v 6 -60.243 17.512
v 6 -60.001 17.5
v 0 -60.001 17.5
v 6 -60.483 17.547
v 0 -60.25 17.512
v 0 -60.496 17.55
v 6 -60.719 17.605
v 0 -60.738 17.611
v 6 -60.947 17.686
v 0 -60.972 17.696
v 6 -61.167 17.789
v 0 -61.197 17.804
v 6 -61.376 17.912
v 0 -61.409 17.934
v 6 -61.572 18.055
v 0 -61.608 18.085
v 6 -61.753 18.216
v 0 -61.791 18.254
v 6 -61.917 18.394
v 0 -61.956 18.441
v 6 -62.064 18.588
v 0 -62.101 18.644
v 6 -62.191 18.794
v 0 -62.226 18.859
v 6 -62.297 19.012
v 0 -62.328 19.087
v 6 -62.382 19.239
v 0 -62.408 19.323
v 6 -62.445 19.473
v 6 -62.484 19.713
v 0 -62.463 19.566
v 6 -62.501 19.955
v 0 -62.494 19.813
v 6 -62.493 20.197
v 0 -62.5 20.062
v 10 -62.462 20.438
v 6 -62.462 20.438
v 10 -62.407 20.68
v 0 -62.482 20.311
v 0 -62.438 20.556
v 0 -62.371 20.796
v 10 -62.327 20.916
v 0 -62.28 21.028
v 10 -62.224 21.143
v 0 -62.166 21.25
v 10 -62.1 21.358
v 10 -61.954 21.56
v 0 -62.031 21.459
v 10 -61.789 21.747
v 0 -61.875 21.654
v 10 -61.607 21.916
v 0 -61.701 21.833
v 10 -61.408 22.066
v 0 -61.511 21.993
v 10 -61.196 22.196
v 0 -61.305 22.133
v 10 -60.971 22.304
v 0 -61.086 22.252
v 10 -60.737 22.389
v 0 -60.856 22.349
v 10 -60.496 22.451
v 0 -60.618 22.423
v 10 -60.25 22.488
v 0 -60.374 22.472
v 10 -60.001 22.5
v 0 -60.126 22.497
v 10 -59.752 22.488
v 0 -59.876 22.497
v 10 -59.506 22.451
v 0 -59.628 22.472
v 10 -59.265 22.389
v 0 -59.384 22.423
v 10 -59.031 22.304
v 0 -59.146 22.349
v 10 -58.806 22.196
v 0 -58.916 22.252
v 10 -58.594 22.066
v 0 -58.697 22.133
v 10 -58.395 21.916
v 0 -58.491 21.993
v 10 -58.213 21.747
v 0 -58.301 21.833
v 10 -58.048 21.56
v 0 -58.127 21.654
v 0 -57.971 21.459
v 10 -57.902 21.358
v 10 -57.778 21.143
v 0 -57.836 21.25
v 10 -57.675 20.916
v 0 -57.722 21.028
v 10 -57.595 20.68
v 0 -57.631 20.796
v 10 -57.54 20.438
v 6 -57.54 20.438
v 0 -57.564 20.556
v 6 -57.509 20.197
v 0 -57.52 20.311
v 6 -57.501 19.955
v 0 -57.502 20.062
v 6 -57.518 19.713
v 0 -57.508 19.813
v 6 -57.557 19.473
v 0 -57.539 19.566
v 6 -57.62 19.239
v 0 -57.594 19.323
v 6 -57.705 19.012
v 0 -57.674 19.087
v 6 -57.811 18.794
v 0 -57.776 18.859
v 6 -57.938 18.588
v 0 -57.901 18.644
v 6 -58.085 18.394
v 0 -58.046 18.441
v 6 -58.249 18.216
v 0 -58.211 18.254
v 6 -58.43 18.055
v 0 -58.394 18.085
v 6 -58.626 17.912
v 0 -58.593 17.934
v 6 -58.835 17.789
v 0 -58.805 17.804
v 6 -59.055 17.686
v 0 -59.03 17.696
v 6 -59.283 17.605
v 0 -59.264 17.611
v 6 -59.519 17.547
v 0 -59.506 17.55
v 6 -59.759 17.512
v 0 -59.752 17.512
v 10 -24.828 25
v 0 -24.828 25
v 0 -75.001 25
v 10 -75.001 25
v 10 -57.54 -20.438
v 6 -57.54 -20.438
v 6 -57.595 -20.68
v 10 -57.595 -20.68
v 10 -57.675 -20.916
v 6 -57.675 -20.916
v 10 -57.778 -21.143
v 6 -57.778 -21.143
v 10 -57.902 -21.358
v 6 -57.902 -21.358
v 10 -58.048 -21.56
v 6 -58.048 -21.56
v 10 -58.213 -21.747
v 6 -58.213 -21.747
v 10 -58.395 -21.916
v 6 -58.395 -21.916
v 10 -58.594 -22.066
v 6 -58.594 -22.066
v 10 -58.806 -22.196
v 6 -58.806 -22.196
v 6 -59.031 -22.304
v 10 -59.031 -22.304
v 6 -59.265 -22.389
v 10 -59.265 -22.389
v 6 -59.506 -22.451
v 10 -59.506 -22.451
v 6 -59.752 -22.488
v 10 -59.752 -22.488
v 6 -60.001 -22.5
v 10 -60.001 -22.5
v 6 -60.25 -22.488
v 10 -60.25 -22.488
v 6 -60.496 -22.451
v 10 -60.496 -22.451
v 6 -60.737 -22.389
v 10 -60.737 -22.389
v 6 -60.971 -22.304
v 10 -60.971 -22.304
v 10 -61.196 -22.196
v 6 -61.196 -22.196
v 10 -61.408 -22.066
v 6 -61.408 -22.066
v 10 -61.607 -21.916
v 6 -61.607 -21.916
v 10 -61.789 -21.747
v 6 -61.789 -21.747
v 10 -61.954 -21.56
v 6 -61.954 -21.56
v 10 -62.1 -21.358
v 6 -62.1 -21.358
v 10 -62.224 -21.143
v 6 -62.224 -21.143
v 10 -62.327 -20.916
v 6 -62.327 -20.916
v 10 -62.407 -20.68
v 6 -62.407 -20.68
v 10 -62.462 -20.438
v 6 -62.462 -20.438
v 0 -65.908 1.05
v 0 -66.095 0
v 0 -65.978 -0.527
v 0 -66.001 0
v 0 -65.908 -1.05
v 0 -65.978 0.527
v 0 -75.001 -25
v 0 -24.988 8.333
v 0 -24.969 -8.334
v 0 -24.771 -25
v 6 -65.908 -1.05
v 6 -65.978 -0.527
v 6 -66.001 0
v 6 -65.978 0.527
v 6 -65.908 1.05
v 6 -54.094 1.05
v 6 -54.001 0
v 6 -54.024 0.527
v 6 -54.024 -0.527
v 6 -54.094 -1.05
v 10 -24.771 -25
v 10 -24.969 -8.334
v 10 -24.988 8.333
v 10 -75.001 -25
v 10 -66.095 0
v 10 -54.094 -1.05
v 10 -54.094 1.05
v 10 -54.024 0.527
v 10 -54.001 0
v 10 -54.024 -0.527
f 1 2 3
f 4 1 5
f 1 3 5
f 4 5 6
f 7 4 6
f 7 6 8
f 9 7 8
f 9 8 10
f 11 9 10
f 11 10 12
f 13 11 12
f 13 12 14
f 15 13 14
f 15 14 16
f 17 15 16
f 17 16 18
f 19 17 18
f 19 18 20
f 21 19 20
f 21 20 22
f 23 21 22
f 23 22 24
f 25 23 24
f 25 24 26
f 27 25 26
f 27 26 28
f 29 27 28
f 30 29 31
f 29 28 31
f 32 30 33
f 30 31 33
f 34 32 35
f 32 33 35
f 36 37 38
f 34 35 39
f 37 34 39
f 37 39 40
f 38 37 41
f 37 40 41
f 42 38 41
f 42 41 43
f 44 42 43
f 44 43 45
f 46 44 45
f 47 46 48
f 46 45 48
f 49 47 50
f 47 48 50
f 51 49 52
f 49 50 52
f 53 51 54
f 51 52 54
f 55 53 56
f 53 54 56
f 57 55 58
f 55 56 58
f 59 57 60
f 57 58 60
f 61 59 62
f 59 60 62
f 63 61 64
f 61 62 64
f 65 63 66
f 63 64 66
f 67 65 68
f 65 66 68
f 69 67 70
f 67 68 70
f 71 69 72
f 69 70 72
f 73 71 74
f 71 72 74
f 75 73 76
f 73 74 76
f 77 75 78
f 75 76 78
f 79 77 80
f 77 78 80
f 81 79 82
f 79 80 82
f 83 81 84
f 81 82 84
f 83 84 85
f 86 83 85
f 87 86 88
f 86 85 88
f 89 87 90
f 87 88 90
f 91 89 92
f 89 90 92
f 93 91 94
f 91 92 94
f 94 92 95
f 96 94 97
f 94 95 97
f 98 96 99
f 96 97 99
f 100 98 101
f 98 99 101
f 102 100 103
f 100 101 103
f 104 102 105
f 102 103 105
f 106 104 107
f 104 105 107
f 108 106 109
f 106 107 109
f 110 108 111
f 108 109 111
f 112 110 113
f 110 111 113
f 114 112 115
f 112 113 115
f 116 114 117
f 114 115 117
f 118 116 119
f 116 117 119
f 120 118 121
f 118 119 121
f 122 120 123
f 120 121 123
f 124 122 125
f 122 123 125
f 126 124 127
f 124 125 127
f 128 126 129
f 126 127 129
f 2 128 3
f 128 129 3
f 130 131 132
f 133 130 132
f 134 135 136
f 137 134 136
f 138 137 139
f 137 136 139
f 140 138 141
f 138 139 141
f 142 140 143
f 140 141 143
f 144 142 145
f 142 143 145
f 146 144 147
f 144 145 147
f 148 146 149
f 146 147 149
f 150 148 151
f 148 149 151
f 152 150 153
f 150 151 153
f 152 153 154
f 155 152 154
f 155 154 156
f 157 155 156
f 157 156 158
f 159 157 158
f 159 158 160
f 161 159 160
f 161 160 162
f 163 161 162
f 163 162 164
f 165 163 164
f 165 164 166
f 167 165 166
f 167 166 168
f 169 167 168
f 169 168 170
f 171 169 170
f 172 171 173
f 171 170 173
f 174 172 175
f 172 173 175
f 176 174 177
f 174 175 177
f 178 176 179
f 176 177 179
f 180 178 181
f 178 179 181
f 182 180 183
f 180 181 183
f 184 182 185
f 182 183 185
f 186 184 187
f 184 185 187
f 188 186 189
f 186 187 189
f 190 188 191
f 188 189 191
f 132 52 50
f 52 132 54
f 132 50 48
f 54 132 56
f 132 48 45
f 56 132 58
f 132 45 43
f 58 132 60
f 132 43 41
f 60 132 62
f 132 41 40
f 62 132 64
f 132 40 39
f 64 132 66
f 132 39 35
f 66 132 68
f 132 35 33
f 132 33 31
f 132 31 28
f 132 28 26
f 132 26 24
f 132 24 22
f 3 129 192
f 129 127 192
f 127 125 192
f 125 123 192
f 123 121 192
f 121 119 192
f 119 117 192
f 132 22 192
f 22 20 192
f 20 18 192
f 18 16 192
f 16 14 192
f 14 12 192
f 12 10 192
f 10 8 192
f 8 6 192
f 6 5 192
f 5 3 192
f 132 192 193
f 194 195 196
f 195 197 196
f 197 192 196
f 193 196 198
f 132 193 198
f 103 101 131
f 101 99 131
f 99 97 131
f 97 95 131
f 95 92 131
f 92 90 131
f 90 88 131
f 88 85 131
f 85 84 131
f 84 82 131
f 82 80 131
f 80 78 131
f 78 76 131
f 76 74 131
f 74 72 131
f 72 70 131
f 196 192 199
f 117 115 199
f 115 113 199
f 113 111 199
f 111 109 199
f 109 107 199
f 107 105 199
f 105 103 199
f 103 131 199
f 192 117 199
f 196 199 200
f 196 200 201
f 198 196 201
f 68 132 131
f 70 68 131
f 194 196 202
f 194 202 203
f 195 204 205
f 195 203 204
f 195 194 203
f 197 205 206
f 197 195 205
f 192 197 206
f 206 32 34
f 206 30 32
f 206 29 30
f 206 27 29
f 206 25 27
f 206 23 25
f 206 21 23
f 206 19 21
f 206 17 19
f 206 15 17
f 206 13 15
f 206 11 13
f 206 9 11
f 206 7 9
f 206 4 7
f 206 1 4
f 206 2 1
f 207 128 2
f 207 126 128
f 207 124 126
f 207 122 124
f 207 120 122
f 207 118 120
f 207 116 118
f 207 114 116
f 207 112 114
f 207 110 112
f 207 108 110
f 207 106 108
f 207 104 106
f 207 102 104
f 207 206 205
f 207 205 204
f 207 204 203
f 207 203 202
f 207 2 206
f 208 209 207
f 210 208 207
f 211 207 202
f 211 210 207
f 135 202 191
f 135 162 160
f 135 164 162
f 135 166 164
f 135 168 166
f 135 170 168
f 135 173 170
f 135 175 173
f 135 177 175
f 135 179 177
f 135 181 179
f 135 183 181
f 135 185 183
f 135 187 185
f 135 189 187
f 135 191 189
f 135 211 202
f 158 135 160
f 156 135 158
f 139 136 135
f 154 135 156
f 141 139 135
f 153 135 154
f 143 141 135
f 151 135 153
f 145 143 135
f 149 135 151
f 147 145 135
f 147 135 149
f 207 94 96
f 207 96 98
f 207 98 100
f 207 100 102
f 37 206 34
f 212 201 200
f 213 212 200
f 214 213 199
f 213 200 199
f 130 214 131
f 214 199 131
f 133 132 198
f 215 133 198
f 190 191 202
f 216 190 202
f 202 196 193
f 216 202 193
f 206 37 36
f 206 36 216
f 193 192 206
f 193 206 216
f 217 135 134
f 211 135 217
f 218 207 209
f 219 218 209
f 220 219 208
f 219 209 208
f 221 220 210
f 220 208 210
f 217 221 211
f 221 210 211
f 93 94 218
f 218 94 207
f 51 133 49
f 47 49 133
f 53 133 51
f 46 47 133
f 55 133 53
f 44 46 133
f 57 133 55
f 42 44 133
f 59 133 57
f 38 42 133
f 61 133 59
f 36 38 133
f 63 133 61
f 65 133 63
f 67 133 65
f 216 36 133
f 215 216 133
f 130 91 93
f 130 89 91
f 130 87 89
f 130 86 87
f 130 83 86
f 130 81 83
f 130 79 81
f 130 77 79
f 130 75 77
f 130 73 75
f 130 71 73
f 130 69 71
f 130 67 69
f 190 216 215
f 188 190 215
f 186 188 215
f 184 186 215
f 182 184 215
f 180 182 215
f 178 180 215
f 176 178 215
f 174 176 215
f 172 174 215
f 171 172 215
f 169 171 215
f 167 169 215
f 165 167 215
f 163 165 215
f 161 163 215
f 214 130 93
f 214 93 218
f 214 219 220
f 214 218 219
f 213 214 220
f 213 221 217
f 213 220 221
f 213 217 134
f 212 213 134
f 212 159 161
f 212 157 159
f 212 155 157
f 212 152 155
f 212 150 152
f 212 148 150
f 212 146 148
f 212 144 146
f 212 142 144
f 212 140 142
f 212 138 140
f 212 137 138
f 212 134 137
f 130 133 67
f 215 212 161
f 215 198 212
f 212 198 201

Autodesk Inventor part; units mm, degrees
ref_plane "YZ Plane" through (0, 0, 0) normal (1, 0, 0) x (0, 1, 0)
ref_plane "XZ Plane" through (0, 0, 0) normal (0, 1, 0) x (-1, 0, 0)
ref_plane "XY Plane" through (0, 0, 0) normal (0, 0, 1) x (1, 0, 0)
sketch "Boceto1" plane through (0, 0, 0) normal (1, 0, 0) x (0, 1, 0)
  line L0 (0, 0) -> (0, 125)
  line L1 (0, 0) -> (125, 0) construction
  line L2 (0, 0) -> (0, -125)
  line L3 (0, 0) -> (125, 0) construction
  line L4 (0, 0) -> (-20, 0)
  line L5 (0, 0) -> (20, 0) construction
  line L6 (0, 0) -> (500, 0) construction
  line L7 (0, 0) -> (-20, 0)
  line L8 (0, 0) -> (20, 0) construction
  line L9 (0, 0) -> (0, -246.4363)
  line L10 (0, 0) -> (246.4363, 0) construction
  line L11 (0, 0) -> (0, 250)
  line L12 (0, 0) -> (250, 0) construction
  arc A0 (0, 250) -> (0, -246.4363) centre (1530.2267, 1.7819) ccw
  line L13 (0, 125) -> (-100, 125)
  line L14 (0, 125) -> (100, 125) construction
  line L15 (0, 250) -> (-5, 250)
  line L16 (0, 250) -> (5, 250) construction
  line L17 (0, -246.4363) -> (-5, -246.4363)
  line L18 (-20, 0) -> (-23, 0)
  line L19 (-20, 0) -> (-17, 0) construction
  line L20 (-20, 0) -> (-25, 0)
  line L21 (-20, 0) -> (-15, 0) construction
  arc A1 (-5, 250) -> (-5, -246.4363) centre (1525.2267, 1.7819) ccw
  point P0 (-20.0963, 125)
  point P1 (-15.0963, 125)
  dimension "d14" = 100
  dimension "d15" = 180
  dimension "d16" = 5
  dimension "d17" = 180
  dimension "d18" = 5
  dimension "d19" = 3
  dimension "d20" = 180
  dimension "d21" = 5
  dimension "d22" = 180
revolve "Revolución1" add sketch "Boceto1" angle 90 about axis through (0, -20, 0) along (0, -1, 0) contours L18 L20 A1 L13 A0
fillet "Empalme1" [suppressed]
sketch "Boceto2" plane through (0, -25, 0) normal (1, 0, 0) x (0, 0, -1)
  line L0 (0, -0.001) -> (0, 4.7578) projected
  line L1 (0, -0.001) -> (25, -0.001) construction
  line L2 (0, -0.001) -> (0, -25.001)
  line L3 (0, -0.001) -> (25, -0.001) construction
  line L4 (-25, -50.001) -> (25, -50.001)
  line L5 (25, -50.001) -> (25, -0.001)
  line L6 (-25, -0.001) -> (-25, -50.001)
  line L7 (-25, -50.001) -> (25, -0.001) construction
  line L8 (25, -50.001) -> (-25, -0.001) construction
  arc A0 (-250.0001, 20) -> (246.437, 19.9995) centre (-1.7798, 1550.1723) ccw
  line L9 (-25, -0.001) -> (-25, 0.2817)
  line L10 (25, -0.001) -> (25, 0.5411)
  line L11 (0, -50.001) -> (0, -35.001)
  line L12 (0, -50.001) -> (15, -50.001) construction
  circle A1 centre (0, -35.001) radius 6
  line L13 (0, -35.001) -> (-20, -35.001)
  line L14 (0, -35.001) -> (20, -35.001) construction
  circle A2 centre (-20, -35.001) radius 2.5
  line L15 (-20.4375, -32.5396) -> (-1.05, -29.0936)
  line L16 (-20.4375, -37.4624) -> (0, -41.0951)
  line L17 (0, -35.001) -> (0, -29.001)
  line L18 (25, -50.001) -> (-25, -0.001) construction
  circle A3 centre (0, -35.001) radius 6
  line L19 (0, -35.001) -> (20, -35.001)
  circle A4 centre (20, -35.001) radius 2.5
  line L20 (20.4375, -32.5396) -> (1.05, -29.0936)
  line L21 (20.4375, -37.4624) -> (0, -41.0951)
  point P0 (0, 25)
  point P1 (0, 0)
  point P2 (-20.2213, -32.5012)
  point P3 (20.2213, -32.5012)
  point P4 (1.05, -29.0936)
  point P5 (25, 0.2293)
  point P6 (-25, 0.1719)
  point P7 (0, 4.9037)
  point P8 (-1.05, -40.9084)
  point P9 (1.05, -40.9084)
  dimension "d25" = 25
  dimension "d27" = 25
  dimension "d28" = 90
  dimension "d29" = 50
  dimension "d30" = 50
  dimension "d31" = 15
  dimension "d32" = 90
  dimension "d33" = 12
  dimension "d34" = 20
  dimension "d35" = 180
  dimension "d36" = 5
extrude "Extrusión1" add sketch "Boceto2" along normal blind 10
extrude "Extrusión2" add sketch "Boceto2" along normal blind 6 contours A1 L13 L11 | L11 L19 A1 | L16 A2 L13 A1 | A1 L19 A4 L21 | L13 A1 L17 | L17 A1 L19 | L13 A2 L15 A1 | A1 L20 A4 L19 | A4
sketch "Boceto3" plane through (0, -25, 0) normal (1, 0, 0) x (0, 0, -1)
  arc A0 (-25, 0.1719) -> (25, 0.2293) centre (-1.7798, 1550.1723) ccw projected
  line L0 (0, -0.001) -> (-143.598, -0.001)
  line L1 (-143.598, -0.001) -> (-143.598, 29.4802)
  line L2 (-143.598, 29.4802) -> (0, 29.4802)
  line L3 (0, 29.4802) -> (0, -0.001)
  point P0 (0, 25)
extrude "Extrusión3" cut sketch "Boceto3" against normal blind 152
